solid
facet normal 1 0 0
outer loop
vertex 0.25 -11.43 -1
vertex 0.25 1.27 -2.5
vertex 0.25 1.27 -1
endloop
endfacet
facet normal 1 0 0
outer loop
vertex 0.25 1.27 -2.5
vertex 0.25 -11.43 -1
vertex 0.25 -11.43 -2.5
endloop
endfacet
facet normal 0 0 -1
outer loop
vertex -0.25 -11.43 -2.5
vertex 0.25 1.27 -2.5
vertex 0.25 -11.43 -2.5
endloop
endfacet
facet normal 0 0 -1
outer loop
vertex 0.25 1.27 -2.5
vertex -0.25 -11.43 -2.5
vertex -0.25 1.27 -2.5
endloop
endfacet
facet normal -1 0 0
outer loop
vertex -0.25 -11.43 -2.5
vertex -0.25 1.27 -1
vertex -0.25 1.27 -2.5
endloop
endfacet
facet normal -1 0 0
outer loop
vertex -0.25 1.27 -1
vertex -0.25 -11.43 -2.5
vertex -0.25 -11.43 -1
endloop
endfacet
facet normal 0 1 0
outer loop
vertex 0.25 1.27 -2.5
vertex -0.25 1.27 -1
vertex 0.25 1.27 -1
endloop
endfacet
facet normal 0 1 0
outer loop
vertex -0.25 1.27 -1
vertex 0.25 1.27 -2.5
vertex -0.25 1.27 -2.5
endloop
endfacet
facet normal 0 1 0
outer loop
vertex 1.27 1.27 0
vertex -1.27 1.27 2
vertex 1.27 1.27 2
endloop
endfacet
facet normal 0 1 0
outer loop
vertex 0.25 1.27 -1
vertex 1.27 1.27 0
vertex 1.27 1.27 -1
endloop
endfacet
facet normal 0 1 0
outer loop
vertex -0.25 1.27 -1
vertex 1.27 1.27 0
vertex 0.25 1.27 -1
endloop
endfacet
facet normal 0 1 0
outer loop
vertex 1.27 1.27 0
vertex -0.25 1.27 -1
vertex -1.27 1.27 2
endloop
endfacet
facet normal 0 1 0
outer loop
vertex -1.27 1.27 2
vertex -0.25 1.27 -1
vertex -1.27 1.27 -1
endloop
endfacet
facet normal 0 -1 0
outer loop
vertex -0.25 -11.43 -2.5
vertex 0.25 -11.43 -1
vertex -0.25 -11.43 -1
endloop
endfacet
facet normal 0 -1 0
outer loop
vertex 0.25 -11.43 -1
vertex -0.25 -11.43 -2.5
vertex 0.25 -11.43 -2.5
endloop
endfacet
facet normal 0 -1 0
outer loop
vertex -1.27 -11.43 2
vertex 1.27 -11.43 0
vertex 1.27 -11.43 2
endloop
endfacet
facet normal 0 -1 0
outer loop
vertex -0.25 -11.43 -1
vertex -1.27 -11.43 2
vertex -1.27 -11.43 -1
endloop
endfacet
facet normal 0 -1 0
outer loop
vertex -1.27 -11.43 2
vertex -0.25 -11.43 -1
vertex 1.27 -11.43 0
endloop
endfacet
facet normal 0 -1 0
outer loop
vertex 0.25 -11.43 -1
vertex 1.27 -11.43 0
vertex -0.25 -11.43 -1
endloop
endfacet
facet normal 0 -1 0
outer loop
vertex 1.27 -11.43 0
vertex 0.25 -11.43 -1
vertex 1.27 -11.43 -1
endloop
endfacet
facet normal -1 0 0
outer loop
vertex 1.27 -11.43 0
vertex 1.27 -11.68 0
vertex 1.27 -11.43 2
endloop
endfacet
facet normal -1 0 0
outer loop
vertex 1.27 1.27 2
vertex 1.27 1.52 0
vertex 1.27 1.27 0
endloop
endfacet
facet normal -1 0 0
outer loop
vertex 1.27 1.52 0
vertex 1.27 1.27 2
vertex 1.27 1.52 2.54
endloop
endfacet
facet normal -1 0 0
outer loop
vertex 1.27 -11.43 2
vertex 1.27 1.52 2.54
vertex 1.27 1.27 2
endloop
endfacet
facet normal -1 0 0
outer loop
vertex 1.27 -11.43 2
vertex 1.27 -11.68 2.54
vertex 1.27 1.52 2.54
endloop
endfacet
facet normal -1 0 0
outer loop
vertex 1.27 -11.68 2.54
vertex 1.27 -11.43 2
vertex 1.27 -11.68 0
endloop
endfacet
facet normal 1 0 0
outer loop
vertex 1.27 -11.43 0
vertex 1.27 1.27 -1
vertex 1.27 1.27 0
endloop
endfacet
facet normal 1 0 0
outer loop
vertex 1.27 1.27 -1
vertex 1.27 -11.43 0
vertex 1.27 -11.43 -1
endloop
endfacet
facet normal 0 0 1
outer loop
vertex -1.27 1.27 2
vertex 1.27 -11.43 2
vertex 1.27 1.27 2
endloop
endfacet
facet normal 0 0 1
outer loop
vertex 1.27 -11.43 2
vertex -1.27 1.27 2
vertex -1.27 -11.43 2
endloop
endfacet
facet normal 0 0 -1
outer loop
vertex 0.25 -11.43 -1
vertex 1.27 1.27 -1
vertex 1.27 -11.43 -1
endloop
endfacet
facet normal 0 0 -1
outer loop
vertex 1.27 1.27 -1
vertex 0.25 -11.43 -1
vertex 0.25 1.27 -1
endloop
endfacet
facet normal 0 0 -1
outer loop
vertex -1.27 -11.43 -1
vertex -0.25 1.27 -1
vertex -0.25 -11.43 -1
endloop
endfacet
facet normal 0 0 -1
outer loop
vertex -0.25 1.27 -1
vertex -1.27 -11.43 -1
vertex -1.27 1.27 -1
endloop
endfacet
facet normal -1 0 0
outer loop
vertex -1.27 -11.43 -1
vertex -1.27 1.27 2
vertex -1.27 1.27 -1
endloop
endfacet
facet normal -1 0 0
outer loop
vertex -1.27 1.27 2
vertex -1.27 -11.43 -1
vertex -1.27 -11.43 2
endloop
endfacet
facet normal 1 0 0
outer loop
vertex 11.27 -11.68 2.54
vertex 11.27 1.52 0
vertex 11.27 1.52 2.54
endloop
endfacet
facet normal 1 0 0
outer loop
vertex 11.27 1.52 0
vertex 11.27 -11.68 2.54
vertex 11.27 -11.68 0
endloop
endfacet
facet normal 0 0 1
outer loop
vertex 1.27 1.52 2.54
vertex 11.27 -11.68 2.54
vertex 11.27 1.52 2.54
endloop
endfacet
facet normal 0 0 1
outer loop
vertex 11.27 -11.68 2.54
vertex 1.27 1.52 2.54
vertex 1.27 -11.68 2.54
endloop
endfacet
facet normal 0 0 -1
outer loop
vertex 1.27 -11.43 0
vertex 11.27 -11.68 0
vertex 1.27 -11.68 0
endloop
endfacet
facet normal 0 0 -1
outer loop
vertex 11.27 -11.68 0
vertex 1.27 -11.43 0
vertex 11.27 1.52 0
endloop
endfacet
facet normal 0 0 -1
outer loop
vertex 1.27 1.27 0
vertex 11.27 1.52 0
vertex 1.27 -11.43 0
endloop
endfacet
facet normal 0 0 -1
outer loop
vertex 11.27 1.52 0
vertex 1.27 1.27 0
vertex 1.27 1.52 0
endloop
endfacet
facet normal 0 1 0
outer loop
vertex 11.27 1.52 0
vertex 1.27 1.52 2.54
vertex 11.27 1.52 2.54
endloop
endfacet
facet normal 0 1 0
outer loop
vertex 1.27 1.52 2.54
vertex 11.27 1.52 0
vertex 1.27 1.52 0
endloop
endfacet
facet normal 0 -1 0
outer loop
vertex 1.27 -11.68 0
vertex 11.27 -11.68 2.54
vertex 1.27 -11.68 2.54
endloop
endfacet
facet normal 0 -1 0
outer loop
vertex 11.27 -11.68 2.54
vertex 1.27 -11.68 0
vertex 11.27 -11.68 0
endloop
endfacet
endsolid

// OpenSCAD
n=5;
translate([-0.25,-(n-0.5)*2.54,-2.5]) // Un-cropped pins
cube([0.5,n*2.54,3]);
translate([-1.27,-(n-0.5)*2.54,-1]) // Cropped pins
cube([2.54,n*2.54,3]);
translate([1.27,-(n-0.5)*2.54-0.25,0])
cube([10,n*2.54+0.5,2.54]);
